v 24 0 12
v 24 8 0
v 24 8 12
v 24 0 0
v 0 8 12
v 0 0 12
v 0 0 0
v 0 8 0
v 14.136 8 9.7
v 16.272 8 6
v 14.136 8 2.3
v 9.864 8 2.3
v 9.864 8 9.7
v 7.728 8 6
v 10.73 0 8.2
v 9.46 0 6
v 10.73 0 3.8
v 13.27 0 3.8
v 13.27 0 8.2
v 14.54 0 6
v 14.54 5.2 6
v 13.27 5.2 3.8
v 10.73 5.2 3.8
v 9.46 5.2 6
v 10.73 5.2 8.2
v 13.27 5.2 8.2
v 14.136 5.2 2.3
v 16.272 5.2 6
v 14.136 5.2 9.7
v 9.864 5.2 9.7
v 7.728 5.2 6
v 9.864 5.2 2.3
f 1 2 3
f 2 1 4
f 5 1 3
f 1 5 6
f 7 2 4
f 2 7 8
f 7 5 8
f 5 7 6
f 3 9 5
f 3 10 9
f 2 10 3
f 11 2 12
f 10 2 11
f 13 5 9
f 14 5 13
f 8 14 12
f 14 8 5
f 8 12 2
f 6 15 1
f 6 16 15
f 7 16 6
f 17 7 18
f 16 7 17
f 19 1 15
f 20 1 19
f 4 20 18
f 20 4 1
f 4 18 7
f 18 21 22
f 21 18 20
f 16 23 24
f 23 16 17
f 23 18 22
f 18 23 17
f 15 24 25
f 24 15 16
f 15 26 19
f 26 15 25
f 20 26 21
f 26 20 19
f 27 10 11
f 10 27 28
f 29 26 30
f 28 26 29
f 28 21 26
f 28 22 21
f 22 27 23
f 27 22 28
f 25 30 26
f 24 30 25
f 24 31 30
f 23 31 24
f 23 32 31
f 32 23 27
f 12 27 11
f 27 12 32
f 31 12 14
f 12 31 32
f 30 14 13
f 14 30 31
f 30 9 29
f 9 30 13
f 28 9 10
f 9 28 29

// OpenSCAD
// file: ../../../modules/steel_rack.scad
use <bolts.scad>;

bolt_edge_offset = 15;
bolt_positions = [
  bolt_edge_offset,
  bolt_edge_offset + 98,
  bolt_edge_offset + 98 + 24,
];

module bolt_and_nut(y, h) {
  nut_thickness = 5;
  translate([0, y, h / 2])
    m6_bolt_hole(h + 1, center = true);
  translate([0, y, h - nut_thickness / 2])
    rotate([0, 0, 90])
    m6_nut_trap(nut_thickness, center = true);
}

module long_bar(w, y, h) {
  difference() {
    translate([w / 2, y / 2, h / 2])
      cube([w, y, h], center = true);

    for (x = bolt_positions) {
      translate([x, 0, 0])
        bolt_and_nut(y / 2, h);
    }
  }
}

module short_bar(w, y, h) {
  difference() {
    translate([w / 2, y / 2, h / 2])
      cube([w, y, h], center = true);

    translate([bolt_positions[0], 0, 0])
      bolt_and_nut(y / 2, h);
  }
}

module fillet_profile(r, h) {
  linear_extrude(height = h, center = true)
    difference() {
      square([r, r]);
      circle(r = r, $fn = 64);
    }
}
// file: ../../../modules/bolts.scad
module nut_trap(d, h, center = true) {
  linear_extrude(height = h, center = center)
  circle(d = d / cos(30), $fn = 6);
}

module bolt_hole(d, h, center = true) {
  linear_extrude(height = h, center = center)
  circle(d = d, $fn = 64);
}

// Hex holes for self-tapping (nominal - 0.2mm)
module hex_hole(flat_d, h) {
  linear_extrude(height = h, center = true)
  circle(d = flat_d / cos(30), $fn = 6);
}

module m3_bolt_hexhole(h) {
  rotate([0, 0, 90]) hex_hole(flat_d = 2.8, h = h);
}

module m4_bolt_hexhole(h) {
  rotate([0, 0, 90]) hex_hole(flat_d = 3.8, h = h);
}

module m6_bolt_hexhole(h) {
  rotate([0, 0, 90]) hex_hole(flat_d = 5.8, h = h);
}

module m8_bolt_hexhole(h) {
  rotate([0, 0, 90]) hex_hole(flat_d = 7.8, h = h);
}

// M3
module m3_bolt_hole(h, center = false) { bolt_hole(d = 3.4, h = h, center = center); }
module m3_nut_trap(h, center = false) { nut_trap(d = 5.7, h = h, center = center); }

// M4
module m4_bolt_hole(h, center = false) { bolt_hole(d = 4.4, h = h, center = center); }
module m4_nut_trap(h, center = false) { nut_trap(d = 7.5, h = h, center = center); }

// M6
module m6_bolt_hole(h, center = false) { bolt_hole(d = 6.2, h = h, center = center); }
module m6_nut_trap(h, center = false) { nut_trap(d = 10.2, h = h, center = center); }

// M8
module m8_bolt_hole(h, center = false) { bolt_hole(d = 8.4, h = h, center = center); }
module m8_nut_trap(h, center = false) { nut_trap(d = 13.3, h = h, center = center); }
// file: ../../../modules/slide_rail_outer_bracket.scad
use <bolts.scad>
use <steel_rack.scad>

// スライドレール外側とL字アングルを接合するL字ブラケット。
// 設計の経緯と確定値は ledger/designs/steel-rack-500x400.md が正本。
//
// 座標系 (部品自身の datum):
//   X = 0 がこの部品側のL字アングル外側面。部品はアングル板厚の内側から始まる
//   Y = 0 がスライドレール外側面。+Y がラック外側
//   Z = 0 が部品底面 (レール下端と一致)
// front は screw_x = [37, 101.5]、rear は [79.5, 176] を自分の datum
// から渡す。 M6 が高さ 22.5±12 の対称配置のため部品は Z 反転対称になり、
// 左右のレールにも上下反転するだけで同じ2部品を使い回せる。

bracket_height = 45;
flange_t = 10; // 短辺 (X方向厚) の厚さ
// 長辺 (Y方向厚) の厚さ。旧断面は flange_t=10 を共用していたが、レール面を
// rail_offset 分外へ出すと M6 ナット挿入口が長辺と重なるため 2mm 削った
// (10→8、user決定)。ナット六角の内縁 (y=8.000) と長辺外面がツライチになる
arm_t = 8;
// レール接触面のラック外側オフセット。組付け実測でレール間隔が 385mm しか
// なくケース 412mm が入らないため、(412 - 385) / 2 + 0.5 = 14mm ずつ
// 各レールを外側へ移す (user指示)。M6 実穴は既に開いており位置を変えられない
rail_offset = 14;
inner_r = 4;
m6_z = [ 10.5, 34.5 ];
// クリアランス基準: 呼び寸法 + 0.4mm (実プリントの嵌合結果から拡大)
m6_pass_flat = 6.4; // M6ボルト通し六角の二面幅 (手前5mm)
m6_nut_flat = 10.4; // M6ナット窪み六角の二面幅 (奥5mm、ナット実測9.8 + 実効0.6)
m6_stage_depth = 5;
screw_z = 22.5;
m4_pass_flat = 4.4; // M4小トラスネジ通し六角の二面幅
m4_nut_flat = 7.4; // M4ナット窪み六角の二面幅 (ナット実測6.8 + 実効0.6)
m4_nut_depth = 2.8; // M4ナット窪みの深さ (user指定)
edge_margin = 8; // 穴の外縁から部品端までの余白 (自由な辺のみ)
angle_t = 2.2; // L字アングルの板厚

// 六角プリズム: 軸X・上下の辺が水平 (flat-up)。
// 天井を短い水平ブリッジにして垂れの改善を狙う
// (point-up だと天井面が水平から30°になり垂れた — 嵌合試験で確認済み)
module
hex_x_flat_up(flat_d, l)
{
    rotate([ 0, 90, 0 ]) rotate([ 0, 0, 90 ]) hex_hole(flat_d = flat_d, h = l);
}

// 六角プリズム: 軸Y・上下の辺が水平 (flat-up)。M6と同じくブリッジ天井
module
hex_y_flat_up(flat_d, l)
{
    rotate([ 90, 0, 0 ]) hex_hole(flat_d = flat_d, h = l);
}

module
slide_rail_outer_bracket(screw_x, name = "bracket")
{
    // flat-up配置では水平方向の穴半径は対角/2 (= 二面幅/(2*cos30))。
    // 8mm余白の契約はこの実半径に対して守る
    m6_nut_diag = m6_nut_flat / cos(30);
    m4_nut_diag = m4_nut_flat / cos(30);
    // M6中心: 実物のアングルには旧断面 (長辺厚10) の導出値
    // (厚10 + 内側R + 余白 + M6六角対角/2 = 28.0044) で既に穴が開いている。
    // 旧導出式から rail_offset を引くことで M6 実穴と部品外端の絶対位置を
    // 保ったまま、レール接触面 (y=0) だけをラック外側へ 14mm 出す
    m6_y = flange_t + inner_r + edge_margin + m6_nut_diag / 2 - rail_offset;
    short_len = m6_y + m6_nut_diag / 2 + edge_margin;
    // 長辺のX終端: 最奥のM4穴の最大断面 (ナット窪みの対角の半分) + 余白
    arm_end = max(screw_x) + m4_nut_diag / 2 + edge_margin;

    echo(str("CONTRACT ", name, ": height = ", bracket_height));
    echo(str("CONTRACT ", name, ": flange_t = ", flange_t));
    echo(str("CONTRACT ", name, ": arm_t = ", arm_t));
    echo(str("CONTRACT ", name, ": rail_offset = ", rail_offset));
    echo(str("CONTRACT ", name, ": inner_r = ", inner_r));
    echo(str("CONTRACT ", name, ": m6_z = ", m6_z));
    echo(str("CONTRACT ", name, ": m6_pass_flat = ", m6_pass_flat));
    echo(str("CONTRACT ", name, ": m6_nut_flat = ", m6_nut_flat));
    echo(str("CONTRACT ", name, ": screw_z = ", screw_z));
    echo(str("CONTRACT ", name, ": m4_pass_flat = ", m4_pass_flat));
    echo(str("CONTRACT ", name, ": m4_nut_flat = ", m4_nut_flat));
    echo(str("CONTRACT ", name, ": m4_nut_depth = ", m4_nut_depth));
    echo(str("CONTRACT ", name, ": edge_margin = ", edge_margin));
    echo(str("CONTRACT ", name, ": angle_t = ", angle_t));
    echo(str("CONTRACT ", name, ": screw_x = ", screw_x));
    echo(str("CONTRACT ",
             name,
             ": m6_y = ",
             m6_y,
             ", short_len = ",
             short_len,
             ", arm_end = ",
             arm_end));

    // 余白の契約 (自由な辺のみ。高さ45とM6のZはuser固定値なので対象外)。
    // M6ナット六角の内縁 (m6_y - 対角/2 = 8.000) は長辺外面 (y = arm_t) と
    // ツライチで、ナット挿入口が長辺に塞がれない (1e-9 は浮動小数の丸め猶予)
    assert(m6_y - m6_nut_diag / 2 >= arm_t - 1e-9,
           "M6 nut slot is blocked by the arm");
    assert(short_len - (m6_y + m6_nut_diag / 2) >= edge_margin,
           "M6 hole too close to the short-flange edge");
    assert(arm_end - (max(screw_x) + m4_nut_diag / 2) >= edge_margin,
           "M4 hole too close to the arm end");
    assert(min(screw_x) - m4_nut_diag / 2 >= angle_t + flange_t,
           "M4 hole overlaps the short flange");

    difference()
    {
        union()
        {
            // 短辺: アングル内側に当たる縦板 (M6で締結)
            translate([ angle_t, 0, 0 ])
                cube([ flange_t, short_len, bracket_height ]);

            // 長辺: レール外側面に当たる横板 (M4小トラスネジ+ナットで締結)
            translate([ angle_t, 0, 0 ])
                cube([ arm_end - angle_t, arm_t, bracket_height ]);

            // 内側コーナーのR4フィレット (応力集中の回避)
            translate([
                angle_t + flange_t + inner_r,
                arm_t + inner_r,
                bracket_height / 2
            ]) rotate([ 0, 0, 180 ]) fillet_profile(inner_r, bracket_height);
        }

        // M6の2段六角穴 (軸X・flat-up): 手前5mmが通し、奥5mmがナット窪み。
        // ナット窪みは +X へ延長した挿入回廊 (x=7.2..17): 短辺の背面から
        // fillet の掛かる区間を局所カットし、fillet 外端 (x=16.2) を 0.8mm
        // 超えて開放することで M6 ナットを +X 側から真っ直ぐ挿入できる
        // (fillet と挿入経路の干渉分を削るのは user 許容)。
        // 六角の下頂点 (y=8.000) は長辺外面とツライチで、正確な接触は
        // 退化した稜 (非多様体STL) を作るため、hull で 0.2mm 下へ掃引して
        // 長辺外面に浅い逃げ溝を彫る (ナットの嵌合には影響しない)
        slot_start = angle_t + flange_t - m6_stage_depth;
        slot_end = angle_t + flange_t + inner_r + 0.8;
        slot_relief = 0.2;
        for (z = m6_z) {
            translate([ angle_t + m6_stage_depth / 2 - 0.05, m6_y, z ])
                hex_x_flat_up(m6_pass_flat, m6_stage_depth + 0.1);
            translate([ (slot_start + slot_end) / 2, m6_y, z ]) hull()
            {
                hex_x_flat_up(m6_nut_flat, slot_end - slot_start);
                translate([ 0, -slot_relief, 0 ])
                    hex_x_flat_up(m6_nut_flat, slot_end - slot_start);
            }
        }

        // M4小トラスネジの穴 (軸Y・flat-up):
        // 通しは全厚を貫通し、L字の内側面 (y=8) から深さ2.8mmのナット窪み。
        // ネジはレール内側から刺さり
        // (トラス頭はスライダーと干渉しない実測済み)、
        // ナットが窪みの底で受けてレール板とブラケットを共締めする
        for (x = screw_x) {
            translate([ x, arm_t / 2, screw_z ])
                hex_y_flat_up(m4_pass_flat, arm_t + 0.2);
            translate([ x, arm_t - m4_nut_depth / 2 + 0.05, screw_z ])
                hex_y_flat_up(m4_nut_flat, m4_nut_depth + 0.1);
        }
    }
}
// main file
use <../../../modules/slide_rail_outer_bracket.scad>

// M4小トラスネジ継手の嵌合試験片 (実部品の長辺断面と同じ構成)。
// 通し: 二面幅4.4の六角を全厚8mmに貫通 (flat-up・上辺ブリッジ)。
// ナット窪み: L字内側面にあたる面から深さ2.8mm・二面幅7.4の六角。
// 確認点: M4トラスネジがスルッと通るか、M4ナットが窪みに収まって
// 回り止めが効くか、深さ2.8mmでの飛び出し具合。

width = 24;
// ナット窪み (縦7.4) の上下に2mm以上の肉を残す高さ。8mmだと肉0.3mmで
// 挿入時に割れ、嵌合試験としてクリアランスと切り分けられない
height = 12;
thickness = 8; // 実部品の長辺厚 (arm_t) に追随 (断面変更で10→8)
pass_flat = 4.4; // M4呼び4.0 + 0.4
nut_flat = 7.4;  // ナット実測6.8 + 実効0.6
nut_depth = 2.8;

assert((height - nut_flat) / 2 >= 2,
       "nut pocket needs >=2mm walls above/below");

difference()
{
    cube([ width, thickness, height ]);

    // 通し (全厚)
    translate([ width / 2, thickness / 2, height / 2 ])
        hex_y_flat_up(pass_flat, thickness + 0.2);

    // ナット窪み (内側面から2.8mm)
    translate([ width / 2, thickness - nut_depth / 2 + 0.05, height / 2 ])
        hex_y_flat_up(nut_flat, nut_depth + 0.1);
}
